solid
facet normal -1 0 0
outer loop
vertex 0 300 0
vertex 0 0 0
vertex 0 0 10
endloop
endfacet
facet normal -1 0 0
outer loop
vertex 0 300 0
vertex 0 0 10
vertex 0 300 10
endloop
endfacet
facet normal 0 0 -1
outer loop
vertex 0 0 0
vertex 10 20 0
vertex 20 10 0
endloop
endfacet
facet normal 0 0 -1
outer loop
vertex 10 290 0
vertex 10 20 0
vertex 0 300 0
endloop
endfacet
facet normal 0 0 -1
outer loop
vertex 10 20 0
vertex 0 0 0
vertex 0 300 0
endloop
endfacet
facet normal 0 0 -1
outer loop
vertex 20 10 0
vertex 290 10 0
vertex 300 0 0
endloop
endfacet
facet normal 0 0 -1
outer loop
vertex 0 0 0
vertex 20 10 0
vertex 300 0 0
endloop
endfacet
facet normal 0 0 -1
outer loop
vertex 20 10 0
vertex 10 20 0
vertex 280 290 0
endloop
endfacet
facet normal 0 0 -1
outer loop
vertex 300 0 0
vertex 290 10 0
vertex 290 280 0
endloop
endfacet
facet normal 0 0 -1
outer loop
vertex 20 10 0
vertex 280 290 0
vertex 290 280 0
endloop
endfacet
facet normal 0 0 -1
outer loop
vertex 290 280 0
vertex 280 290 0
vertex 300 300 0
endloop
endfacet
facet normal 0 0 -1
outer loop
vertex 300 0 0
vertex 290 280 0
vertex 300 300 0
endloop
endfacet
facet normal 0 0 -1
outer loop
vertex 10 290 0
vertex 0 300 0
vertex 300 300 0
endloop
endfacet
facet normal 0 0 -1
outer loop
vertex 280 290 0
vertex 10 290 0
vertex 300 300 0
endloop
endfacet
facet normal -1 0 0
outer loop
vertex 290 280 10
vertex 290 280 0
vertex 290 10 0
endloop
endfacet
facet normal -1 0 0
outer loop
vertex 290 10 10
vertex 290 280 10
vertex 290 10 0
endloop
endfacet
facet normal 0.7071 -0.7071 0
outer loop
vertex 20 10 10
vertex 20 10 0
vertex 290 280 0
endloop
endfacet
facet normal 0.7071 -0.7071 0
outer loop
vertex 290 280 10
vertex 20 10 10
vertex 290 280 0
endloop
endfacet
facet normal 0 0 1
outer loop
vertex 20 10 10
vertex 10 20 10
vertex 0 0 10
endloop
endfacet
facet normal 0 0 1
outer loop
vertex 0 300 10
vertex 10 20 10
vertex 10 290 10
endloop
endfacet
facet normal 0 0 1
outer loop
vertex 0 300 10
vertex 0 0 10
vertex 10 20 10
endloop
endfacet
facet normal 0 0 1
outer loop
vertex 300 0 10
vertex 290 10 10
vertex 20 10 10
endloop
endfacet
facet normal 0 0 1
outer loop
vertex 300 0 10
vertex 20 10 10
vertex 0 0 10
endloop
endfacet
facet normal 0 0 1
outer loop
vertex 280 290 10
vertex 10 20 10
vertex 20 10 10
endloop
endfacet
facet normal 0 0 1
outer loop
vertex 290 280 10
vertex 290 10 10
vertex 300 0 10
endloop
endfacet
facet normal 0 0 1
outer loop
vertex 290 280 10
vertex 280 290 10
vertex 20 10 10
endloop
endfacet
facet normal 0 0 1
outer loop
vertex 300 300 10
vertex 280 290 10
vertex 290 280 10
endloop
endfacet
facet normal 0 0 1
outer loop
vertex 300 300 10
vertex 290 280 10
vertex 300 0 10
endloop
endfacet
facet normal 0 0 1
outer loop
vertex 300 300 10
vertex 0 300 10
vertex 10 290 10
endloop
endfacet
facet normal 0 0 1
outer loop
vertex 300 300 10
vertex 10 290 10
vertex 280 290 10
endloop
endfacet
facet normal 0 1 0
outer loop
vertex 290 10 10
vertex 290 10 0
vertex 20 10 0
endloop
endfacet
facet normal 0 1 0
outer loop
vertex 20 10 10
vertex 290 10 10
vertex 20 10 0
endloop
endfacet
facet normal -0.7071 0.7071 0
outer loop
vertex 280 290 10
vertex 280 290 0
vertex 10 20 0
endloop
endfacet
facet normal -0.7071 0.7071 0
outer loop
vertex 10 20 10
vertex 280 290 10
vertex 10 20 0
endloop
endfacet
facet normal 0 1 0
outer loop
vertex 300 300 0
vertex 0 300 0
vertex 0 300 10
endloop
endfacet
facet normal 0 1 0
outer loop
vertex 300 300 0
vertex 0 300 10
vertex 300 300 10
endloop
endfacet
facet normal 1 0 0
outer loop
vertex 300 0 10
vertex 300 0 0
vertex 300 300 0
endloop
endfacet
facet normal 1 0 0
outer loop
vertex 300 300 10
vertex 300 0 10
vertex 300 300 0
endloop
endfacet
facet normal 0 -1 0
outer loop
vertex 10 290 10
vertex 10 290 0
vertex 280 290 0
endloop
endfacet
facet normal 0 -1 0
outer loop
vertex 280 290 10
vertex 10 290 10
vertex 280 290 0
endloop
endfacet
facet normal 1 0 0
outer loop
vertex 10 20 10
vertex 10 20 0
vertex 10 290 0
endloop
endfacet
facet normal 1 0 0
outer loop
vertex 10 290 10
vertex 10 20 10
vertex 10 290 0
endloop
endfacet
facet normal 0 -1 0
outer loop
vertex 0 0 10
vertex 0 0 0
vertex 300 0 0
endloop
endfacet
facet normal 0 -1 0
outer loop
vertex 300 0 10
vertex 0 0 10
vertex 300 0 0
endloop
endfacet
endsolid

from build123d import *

# Parameters (mm, degrees)
F0_W     = 300
F0_H     = 300
F1_DEPTH = 10


with BuildPart() as f1:
    # F0 (on Top) → F1 (new body)
    with BuildSketch(Plane.XY):
        with Locations((150, 150)):
            Rectangle(F0_W, F0_H)
        Polygon((20, 10), (290, 280), (290, 10), align=None, mode=Mode.SUBTRACT)
        Polygon((10, 290), (280, 290), (10, 20), align=None, mode=Mode.SUBTRACT)
    extrude(amount=F1_DEPTH)


solid = f1.part
